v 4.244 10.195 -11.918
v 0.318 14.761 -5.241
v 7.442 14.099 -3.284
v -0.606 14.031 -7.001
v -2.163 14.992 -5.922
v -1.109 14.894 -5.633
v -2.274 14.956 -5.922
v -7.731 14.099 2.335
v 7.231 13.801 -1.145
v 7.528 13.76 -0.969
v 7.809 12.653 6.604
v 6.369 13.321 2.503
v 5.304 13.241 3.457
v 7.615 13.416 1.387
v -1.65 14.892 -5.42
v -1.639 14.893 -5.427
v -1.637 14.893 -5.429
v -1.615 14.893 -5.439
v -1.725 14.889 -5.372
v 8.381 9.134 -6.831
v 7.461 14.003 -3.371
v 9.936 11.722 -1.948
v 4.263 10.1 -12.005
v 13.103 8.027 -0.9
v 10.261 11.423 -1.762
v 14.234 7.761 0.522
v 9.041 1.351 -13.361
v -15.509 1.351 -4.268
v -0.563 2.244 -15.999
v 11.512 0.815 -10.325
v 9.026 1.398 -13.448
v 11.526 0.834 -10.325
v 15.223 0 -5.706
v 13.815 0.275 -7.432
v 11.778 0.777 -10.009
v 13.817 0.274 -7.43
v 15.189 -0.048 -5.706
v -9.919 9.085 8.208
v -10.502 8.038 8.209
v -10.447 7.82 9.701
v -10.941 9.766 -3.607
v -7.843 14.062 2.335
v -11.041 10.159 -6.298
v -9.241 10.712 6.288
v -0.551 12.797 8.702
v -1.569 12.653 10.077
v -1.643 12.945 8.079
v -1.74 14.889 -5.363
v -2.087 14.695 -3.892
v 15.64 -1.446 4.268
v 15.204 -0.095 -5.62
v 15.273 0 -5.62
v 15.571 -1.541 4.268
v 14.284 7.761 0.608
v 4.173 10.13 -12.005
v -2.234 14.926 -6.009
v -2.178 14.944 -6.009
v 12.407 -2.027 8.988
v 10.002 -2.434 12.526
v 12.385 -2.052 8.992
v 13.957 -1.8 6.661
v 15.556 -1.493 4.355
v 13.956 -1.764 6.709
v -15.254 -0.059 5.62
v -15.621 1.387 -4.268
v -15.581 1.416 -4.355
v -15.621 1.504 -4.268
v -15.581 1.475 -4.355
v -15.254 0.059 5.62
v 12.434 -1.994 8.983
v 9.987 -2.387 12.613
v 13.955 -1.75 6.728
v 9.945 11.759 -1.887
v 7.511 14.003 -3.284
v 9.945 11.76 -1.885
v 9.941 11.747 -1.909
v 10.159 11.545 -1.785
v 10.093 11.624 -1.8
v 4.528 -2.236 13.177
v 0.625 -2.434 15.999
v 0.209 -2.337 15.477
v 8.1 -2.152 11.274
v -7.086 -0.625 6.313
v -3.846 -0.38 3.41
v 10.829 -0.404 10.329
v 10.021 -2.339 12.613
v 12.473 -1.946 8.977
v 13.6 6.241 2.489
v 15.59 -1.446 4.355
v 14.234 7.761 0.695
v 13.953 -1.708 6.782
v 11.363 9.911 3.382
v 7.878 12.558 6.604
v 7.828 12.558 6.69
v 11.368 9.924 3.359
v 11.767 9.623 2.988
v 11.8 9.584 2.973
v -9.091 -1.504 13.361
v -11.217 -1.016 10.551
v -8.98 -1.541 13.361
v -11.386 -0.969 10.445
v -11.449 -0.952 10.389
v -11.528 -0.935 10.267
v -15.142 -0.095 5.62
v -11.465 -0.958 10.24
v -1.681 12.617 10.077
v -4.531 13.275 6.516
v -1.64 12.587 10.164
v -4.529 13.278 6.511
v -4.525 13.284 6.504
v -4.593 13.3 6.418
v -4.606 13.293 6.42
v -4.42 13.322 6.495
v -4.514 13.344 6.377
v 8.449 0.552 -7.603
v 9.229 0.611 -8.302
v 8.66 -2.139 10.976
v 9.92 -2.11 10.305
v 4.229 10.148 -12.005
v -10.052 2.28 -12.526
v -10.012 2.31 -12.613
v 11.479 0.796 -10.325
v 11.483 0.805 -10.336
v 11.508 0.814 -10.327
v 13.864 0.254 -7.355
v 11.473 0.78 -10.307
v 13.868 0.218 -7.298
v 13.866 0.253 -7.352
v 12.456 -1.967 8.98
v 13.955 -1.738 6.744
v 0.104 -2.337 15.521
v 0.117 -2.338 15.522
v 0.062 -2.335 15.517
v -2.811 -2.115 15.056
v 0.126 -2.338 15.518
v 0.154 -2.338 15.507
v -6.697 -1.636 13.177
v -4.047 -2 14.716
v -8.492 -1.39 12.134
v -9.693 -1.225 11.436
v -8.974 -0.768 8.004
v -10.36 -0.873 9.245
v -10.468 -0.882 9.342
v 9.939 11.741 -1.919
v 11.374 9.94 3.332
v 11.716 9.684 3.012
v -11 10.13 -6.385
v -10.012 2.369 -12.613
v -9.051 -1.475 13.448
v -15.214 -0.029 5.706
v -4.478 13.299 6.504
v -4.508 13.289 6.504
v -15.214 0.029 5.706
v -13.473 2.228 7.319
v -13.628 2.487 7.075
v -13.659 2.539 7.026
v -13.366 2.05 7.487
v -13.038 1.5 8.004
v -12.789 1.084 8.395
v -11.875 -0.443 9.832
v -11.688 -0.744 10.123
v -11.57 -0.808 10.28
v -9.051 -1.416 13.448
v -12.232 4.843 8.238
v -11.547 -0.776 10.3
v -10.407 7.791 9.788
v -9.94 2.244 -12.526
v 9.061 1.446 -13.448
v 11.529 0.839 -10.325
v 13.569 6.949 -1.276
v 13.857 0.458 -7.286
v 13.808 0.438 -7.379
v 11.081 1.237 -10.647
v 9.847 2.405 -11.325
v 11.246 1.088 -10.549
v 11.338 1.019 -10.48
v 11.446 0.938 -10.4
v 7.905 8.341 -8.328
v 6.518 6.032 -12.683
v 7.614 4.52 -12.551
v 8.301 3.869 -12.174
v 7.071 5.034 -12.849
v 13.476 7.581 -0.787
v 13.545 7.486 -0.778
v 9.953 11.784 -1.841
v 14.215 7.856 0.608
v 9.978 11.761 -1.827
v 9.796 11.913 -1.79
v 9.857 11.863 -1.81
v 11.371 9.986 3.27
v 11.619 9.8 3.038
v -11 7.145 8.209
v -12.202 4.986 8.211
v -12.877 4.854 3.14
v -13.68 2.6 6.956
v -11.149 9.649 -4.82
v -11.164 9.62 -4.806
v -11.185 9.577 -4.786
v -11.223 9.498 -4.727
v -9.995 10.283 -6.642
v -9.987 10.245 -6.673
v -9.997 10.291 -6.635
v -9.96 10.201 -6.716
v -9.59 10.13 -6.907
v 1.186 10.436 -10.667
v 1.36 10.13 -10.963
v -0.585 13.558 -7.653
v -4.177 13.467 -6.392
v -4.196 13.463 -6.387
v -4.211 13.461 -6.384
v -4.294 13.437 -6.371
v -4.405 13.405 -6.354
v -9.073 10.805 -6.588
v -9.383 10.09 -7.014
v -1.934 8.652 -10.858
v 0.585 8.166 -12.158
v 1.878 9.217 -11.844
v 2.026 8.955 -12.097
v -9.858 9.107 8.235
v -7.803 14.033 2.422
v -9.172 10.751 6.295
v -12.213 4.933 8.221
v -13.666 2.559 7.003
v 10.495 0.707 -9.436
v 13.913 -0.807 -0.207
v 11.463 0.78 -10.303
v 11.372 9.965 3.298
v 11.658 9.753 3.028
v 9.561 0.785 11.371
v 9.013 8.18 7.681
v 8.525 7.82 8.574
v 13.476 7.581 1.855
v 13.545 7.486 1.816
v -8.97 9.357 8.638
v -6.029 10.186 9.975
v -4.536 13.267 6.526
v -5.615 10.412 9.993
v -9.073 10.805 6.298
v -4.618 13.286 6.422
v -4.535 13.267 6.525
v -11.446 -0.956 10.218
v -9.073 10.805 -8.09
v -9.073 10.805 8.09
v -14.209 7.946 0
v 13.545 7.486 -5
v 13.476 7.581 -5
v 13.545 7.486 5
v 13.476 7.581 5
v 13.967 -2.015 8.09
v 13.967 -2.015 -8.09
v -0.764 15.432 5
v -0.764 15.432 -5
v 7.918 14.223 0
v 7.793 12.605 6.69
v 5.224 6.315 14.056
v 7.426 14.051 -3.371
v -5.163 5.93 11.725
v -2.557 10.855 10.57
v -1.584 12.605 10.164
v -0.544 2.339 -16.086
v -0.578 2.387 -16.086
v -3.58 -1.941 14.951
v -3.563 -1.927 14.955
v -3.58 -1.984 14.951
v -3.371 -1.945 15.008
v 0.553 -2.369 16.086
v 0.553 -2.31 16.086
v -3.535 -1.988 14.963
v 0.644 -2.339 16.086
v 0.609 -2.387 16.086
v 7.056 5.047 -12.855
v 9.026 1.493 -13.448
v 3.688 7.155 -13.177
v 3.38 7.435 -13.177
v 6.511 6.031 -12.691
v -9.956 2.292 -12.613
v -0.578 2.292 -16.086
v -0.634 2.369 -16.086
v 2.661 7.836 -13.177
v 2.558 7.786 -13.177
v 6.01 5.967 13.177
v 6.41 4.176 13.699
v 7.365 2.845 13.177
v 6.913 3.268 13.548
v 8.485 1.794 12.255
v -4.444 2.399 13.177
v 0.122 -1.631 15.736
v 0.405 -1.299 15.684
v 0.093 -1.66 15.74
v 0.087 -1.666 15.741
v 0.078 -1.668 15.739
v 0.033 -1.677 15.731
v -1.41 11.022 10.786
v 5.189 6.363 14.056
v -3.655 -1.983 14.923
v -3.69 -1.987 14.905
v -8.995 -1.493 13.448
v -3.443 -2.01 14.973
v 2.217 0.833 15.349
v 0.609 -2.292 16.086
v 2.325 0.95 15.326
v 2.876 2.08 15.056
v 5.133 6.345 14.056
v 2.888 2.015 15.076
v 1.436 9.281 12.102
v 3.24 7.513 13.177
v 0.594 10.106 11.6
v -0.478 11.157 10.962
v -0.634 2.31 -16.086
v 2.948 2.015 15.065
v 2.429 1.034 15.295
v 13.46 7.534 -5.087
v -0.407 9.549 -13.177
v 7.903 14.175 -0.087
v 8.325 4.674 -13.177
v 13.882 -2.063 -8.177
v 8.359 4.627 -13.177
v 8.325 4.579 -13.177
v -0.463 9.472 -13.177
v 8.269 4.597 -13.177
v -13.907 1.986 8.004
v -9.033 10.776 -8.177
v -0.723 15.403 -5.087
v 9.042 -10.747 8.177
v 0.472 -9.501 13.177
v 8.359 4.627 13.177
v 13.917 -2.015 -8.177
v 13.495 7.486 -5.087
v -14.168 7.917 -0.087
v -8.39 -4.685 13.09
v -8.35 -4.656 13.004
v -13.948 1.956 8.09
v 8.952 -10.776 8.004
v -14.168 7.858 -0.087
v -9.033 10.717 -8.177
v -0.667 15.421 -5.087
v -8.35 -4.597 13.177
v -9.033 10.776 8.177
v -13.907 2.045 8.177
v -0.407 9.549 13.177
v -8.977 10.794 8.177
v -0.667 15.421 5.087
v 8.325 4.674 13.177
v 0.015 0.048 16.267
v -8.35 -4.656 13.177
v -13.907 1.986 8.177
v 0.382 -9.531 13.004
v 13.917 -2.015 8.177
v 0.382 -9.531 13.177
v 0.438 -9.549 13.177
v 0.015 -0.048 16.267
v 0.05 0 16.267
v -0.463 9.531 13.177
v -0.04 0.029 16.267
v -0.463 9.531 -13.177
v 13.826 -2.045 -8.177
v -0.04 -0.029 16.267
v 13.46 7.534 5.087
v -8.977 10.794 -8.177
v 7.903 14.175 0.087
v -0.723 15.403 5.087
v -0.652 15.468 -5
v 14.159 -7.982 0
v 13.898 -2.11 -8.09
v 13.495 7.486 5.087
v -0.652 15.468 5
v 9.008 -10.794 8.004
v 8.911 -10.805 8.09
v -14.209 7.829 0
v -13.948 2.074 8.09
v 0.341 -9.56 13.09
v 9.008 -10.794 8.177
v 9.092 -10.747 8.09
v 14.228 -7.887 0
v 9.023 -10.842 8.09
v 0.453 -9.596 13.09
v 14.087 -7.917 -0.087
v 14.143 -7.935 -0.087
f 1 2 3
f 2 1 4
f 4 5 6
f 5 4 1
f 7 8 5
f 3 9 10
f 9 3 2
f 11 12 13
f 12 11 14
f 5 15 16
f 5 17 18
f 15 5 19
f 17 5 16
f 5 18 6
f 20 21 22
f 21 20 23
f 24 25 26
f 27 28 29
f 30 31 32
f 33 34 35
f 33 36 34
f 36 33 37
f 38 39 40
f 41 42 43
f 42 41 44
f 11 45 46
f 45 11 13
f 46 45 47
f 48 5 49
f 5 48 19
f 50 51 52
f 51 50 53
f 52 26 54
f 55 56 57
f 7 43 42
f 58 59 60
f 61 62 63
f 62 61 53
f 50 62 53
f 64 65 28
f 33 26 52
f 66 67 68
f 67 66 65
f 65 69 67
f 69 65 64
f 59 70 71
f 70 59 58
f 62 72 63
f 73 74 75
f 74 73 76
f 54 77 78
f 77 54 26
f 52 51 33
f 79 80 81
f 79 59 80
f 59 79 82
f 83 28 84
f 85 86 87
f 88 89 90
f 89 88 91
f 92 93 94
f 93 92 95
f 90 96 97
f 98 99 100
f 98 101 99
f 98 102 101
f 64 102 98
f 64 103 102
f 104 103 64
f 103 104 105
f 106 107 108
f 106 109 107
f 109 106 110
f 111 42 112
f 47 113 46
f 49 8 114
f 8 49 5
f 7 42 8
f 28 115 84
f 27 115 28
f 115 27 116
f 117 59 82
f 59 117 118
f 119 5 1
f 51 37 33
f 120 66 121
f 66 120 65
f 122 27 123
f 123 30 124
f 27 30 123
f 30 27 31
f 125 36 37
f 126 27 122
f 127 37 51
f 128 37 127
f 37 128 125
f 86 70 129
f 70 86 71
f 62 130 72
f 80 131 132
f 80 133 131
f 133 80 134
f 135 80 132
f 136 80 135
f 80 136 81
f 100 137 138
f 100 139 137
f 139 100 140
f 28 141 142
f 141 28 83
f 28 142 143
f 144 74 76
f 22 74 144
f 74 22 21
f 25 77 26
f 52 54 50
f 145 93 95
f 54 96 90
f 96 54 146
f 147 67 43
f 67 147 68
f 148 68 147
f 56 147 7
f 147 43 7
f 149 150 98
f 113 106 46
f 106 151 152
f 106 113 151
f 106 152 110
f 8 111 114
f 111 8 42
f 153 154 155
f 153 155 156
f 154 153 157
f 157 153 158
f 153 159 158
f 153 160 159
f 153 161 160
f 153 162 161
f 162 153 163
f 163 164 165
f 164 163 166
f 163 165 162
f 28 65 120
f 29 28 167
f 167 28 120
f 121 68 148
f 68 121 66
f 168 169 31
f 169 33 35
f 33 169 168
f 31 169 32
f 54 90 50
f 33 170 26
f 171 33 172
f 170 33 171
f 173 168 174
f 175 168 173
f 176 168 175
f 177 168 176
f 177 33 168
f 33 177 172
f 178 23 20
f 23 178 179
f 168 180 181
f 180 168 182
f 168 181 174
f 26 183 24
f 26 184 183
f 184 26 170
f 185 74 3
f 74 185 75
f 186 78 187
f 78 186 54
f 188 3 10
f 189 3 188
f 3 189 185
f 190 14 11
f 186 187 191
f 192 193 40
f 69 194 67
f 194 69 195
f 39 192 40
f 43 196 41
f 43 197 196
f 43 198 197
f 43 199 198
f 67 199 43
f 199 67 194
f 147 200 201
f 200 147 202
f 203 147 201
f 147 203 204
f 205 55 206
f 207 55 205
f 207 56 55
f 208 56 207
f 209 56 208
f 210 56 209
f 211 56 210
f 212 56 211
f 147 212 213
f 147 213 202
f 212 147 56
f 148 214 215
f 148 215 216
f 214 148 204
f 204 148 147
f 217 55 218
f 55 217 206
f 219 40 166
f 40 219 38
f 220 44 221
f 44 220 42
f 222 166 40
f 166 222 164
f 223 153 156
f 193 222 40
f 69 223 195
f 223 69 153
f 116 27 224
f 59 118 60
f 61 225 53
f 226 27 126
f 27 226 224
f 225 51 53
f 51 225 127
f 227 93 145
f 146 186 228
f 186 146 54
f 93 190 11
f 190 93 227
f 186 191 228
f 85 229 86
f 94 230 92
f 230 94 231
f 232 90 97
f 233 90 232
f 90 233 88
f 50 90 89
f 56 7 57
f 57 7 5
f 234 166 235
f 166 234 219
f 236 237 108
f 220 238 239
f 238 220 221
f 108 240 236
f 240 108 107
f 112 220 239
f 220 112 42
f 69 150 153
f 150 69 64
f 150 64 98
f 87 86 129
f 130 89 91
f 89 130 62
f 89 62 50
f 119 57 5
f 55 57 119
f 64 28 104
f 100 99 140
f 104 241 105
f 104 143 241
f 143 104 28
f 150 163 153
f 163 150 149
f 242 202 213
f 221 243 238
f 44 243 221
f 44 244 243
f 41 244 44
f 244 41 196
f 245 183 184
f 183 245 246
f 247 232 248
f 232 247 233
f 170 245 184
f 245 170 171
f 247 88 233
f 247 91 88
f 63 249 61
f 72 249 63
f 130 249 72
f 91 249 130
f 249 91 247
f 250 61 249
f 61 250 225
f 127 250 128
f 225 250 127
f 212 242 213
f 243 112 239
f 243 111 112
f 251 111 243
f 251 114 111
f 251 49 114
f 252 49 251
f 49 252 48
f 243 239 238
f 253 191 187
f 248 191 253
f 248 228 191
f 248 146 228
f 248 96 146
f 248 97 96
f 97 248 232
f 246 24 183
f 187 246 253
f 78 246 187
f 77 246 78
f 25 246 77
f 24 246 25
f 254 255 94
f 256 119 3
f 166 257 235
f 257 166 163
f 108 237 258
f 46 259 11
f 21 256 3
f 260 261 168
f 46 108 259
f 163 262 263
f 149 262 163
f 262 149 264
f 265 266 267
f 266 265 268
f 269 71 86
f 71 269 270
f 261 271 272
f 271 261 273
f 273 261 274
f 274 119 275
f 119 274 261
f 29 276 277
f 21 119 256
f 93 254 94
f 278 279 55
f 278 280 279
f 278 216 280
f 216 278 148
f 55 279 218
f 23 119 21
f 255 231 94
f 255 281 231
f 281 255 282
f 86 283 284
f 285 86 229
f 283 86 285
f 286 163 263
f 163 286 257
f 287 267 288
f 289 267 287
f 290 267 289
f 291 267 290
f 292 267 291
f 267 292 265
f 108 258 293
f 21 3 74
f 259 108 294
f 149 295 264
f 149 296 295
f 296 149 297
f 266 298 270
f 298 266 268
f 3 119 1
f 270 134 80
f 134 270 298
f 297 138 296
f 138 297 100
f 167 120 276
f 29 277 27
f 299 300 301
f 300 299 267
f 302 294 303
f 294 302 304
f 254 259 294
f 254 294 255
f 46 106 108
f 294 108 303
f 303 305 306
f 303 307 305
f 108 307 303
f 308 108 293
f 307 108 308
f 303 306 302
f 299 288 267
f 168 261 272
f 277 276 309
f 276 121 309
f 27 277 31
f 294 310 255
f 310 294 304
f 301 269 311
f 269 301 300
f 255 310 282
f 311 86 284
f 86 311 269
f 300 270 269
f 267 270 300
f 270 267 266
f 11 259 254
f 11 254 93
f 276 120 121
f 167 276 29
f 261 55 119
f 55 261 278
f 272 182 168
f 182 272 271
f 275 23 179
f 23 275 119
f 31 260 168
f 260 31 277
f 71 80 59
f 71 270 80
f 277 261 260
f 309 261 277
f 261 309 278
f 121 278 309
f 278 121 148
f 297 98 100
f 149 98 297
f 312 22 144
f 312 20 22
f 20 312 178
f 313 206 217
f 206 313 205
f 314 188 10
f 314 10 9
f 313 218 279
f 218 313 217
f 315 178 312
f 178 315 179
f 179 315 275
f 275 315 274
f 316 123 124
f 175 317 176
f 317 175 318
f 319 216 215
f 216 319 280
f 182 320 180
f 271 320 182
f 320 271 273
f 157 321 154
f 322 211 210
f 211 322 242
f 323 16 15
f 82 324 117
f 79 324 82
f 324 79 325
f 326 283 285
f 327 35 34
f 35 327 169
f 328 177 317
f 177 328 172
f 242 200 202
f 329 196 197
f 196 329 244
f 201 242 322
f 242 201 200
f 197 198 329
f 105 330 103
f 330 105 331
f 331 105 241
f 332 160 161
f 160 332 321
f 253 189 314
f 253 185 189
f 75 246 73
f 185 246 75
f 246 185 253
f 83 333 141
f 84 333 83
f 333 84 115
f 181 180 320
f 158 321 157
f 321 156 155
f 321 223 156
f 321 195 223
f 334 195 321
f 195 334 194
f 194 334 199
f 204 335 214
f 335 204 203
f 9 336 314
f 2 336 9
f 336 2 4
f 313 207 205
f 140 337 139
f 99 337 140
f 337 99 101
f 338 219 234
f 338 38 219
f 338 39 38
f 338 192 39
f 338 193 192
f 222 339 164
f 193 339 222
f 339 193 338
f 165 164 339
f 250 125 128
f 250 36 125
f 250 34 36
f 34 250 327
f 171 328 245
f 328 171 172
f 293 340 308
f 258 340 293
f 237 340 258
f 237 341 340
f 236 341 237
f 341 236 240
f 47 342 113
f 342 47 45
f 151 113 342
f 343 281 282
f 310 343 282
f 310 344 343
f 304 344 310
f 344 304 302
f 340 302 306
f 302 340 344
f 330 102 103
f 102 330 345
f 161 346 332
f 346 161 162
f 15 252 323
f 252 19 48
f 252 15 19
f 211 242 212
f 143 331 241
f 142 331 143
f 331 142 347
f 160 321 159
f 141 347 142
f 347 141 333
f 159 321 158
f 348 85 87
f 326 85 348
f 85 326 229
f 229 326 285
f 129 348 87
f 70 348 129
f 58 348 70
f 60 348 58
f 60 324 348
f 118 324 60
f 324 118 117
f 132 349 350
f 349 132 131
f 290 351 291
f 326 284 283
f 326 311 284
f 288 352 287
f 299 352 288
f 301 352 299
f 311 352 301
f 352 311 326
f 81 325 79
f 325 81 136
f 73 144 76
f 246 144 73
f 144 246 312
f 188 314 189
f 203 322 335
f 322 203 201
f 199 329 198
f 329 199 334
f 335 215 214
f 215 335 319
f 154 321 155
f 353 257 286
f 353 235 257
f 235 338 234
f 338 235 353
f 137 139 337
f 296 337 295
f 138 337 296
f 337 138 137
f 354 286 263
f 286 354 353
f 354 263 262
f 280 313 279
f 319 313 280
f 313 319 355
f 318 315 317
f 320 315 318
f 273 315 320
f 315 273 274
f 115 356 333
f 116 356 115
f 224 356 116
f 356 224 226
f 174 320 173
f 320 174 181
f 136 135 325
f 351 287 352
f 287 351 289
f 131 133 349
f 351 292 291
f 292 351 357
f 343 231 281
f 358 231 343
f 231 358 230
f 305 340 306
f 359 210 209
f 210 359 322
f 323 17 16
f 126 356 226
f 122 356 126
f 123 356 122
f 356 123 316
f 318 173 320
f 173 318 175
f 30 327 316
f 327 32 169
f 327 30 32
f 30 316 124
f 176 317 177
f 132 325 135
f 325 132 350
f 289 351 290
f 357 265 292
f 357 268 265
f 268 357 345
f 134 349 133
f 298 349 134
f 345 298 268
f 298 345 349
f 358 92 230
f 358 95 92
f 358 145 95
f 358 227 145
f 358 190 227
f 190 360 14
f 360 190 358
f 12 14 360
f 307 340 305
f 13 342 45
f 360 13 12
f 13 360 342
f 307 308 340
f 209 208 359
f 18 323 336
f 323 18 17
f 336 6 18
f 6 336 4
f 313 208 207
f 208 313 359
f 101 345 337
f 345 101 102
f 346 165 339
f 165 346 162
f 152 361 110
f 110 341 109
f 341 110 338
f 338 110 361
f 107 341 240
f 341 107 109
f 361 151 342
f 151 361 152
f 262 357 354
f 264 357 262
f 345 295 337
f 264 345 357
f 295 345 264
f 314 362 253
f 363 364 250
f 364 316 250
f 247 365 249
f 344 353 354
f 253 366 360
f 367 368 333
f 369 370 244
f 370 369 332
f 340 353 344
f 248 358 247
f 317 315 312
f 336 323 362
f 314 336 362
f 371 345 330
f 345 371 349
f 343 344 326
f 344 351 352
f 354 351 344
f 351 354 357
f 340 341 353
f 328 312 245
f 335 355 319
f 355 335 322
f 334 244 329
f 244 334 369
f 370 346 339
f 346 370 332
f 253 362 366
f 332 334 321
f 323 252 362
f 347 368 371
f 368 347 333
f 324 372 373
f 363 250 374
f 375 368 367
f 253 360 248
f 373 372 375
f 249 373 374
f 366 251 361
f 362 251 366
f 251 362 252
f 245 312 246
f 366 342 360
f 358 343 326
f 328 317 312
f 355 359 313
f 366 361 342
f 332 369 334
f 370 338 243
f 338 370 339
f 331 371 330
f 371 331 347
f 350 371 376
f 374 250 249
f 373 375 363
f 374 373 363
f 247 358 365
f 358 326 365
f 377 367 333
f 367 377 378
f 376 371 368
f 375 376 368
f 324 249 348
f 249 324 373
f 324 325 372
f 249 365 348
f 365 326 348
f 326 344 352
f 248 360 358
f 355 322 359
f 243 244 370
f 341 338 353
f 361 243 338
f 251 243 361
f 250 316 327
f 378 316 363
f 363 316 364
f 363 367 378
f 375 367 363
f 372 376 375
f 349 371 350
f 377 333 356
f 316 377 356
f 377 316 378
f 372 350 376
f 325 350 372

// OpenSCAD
// Auto-generated OpenSCAD file

    inner_points = 10*[[1.4127776500989453, -0.7887289142226223, 3.3946051633490118e-15], [-1.4127776500989453, 0.7887289142226223, -3.3946051633490118e-15], [7.699325831418754e-14, 1.448747966845947e-13, 1.618033988749895], [0.7887289142226223, 1.4127776500989453, -1.6402787932550622e-13], [1.3866917666528789, -0.20152279240725185, 0.8090169943748995], [1.386691766652802, -0.2015227924073968, -0.8090169943749954], [0.899230489753498, -1.0746673987146065, 0.809016994375001], [-0.8992304897534211, 1.0746673987147513, 0.8090169943748939], [-0.899230489753498, 1.0746673987146065, -0.809016994375001], [-1.386691766652802, 0.2015227924073968, 0.8090169943749954], [1.3444839206104982, 0.7485966710918835, 0.499999999999869], [1.3444839206104504, 0.7485966710917942, -0.500000000000131], [-0.06829372948844725, 1.5373255853145058, 0.49999999999986555], [-0.06829372948849499, 1.5373255853144165, -0.5000000000001343], [0.8309367602650506, 0.46265818659989943, 1.3090169943748666], [0.8309367602649261, 0.46265818659966507, -1.3090169943750283], [0.04220784604242839, -0.950119463499046, 1.3090169943750305], [-0.042207846042303876, 0.9501194634992803, 1.3090169943748644], [-0.04220784604242839, 0.950119463499046, -1.3090169943750305], [-0.8309367602649261, -0.46265818659966507, 1.3090169943750283]];

    outer_points = 10*[[1.51730962461505, 0.0, -0.5619657389916497], [-1.51730962461505, 0.0, 0.5619657389916497], [0.5173908766017687, 0.6315464316752465, 1.3969573272642983], [-0.2193448714004602, 1.4896922814420965, -0.592231983898246], [1.4184434174514022, 0.7761134471924181, 0.0608290828944803], [0.9010525408496336, 0.14456701551717166, -1.3361282443698181], [1.5540060032348615, -0.14456701551717166, 0.42684857816837674], [-1.0366151266330927, 0.7761134471924181, 0.9701087490959216], [-1.5540060032348615, 0.14456701551717166, -0.42684857816837674], [-0.9010525408496336, -0.14456701551717166, 1.3361282443698181], [0.7410836573200632, 1.4003449522003508, -0.3284250545406229], [0.4213185101110674, 1.0100277919513354, -1.1917921636231694], [-0.7762259672949867, 1.4003449522003508, 0.2335406844510268], [-1.0959911145039825, 1.0100277919513354, -0.6298264246315197], [0.7777800359398745, 1.2557779366831792, 0.6603892626194036], [-0.05937598787088977, 0.23391434475891726, -1.5999351737274412], [0.9971249073403348, -0.23391434475891726, 1.2526212465176494], [-0.15996888352957034, 1.2557779366831792, 1.0077031898291953], [-0.9971249073403348, 0.23391434475891726, -1.2526212465176494], [0.05937598787088977, -0.23391434475891726, 1.5999351737274412]];

    // Convex hull for inner set (I)
    module inner_hull() {
        hull() {
            for (p = inner_points) {
                translate(p) sphere(r=0.1);
            }
        }
    }

    // Convex hull for outer set (O) minus inner hull (O \ I)
    module outer_minus_inner() {
        difference() {
            hull() {
                for (p = outer_points) {
                    translate(p) sphere(r=0.1);
                }
            }
            inner_hull(); // Subtract inner hull
        }
    }

    // Convex hull for outer set (O) minus all translated inner hulls
    module outer_minus_AllTranslationInner() {
        difference() {
            hull() {
                for (p = outer_points) {
                    translate(p) sphere(r=0.1);
                }
            }
            hull() {
                translate([0,0,50]) inner_hull();
                translate([0,0,-50]) inner_hull();
            }; // Subtract translated inner hulls
        }
    }

    // Difference between outer_minus_inner and outer_minus_AllTranslationInner
    module outer_minus_inner_diff() {
        difference() {
            // Outer minus inner
            difference() {
                hull() {
                    for (p = outer_points) {
                        translate(p) sphere(r=0.1);
                    }
                }
                inner_hull();
            }

            // Subtract Outer minus AllTranslationInner
            difference() {
                hull() {
                    for (p = outer_points) {
                        translate(p) sphere(r=0.1);
                    }
                }
                hull() {
                    translate([0,0,50]) inner_hull();
                    translate([0,0,-50]) inner_hull();
                };
            }
        }
    }

    // Rendering all with colors applied
    color([1, 0, 0, 0.5]) inner_hull(); // Transparent red
    color([0, 1, 0, 1]) outer_minus_AllTranslationInner(); // Opaque green
    color([1, 1, 0, 1]) outer_minus_inner_diff(); // Opaque yellow
    
